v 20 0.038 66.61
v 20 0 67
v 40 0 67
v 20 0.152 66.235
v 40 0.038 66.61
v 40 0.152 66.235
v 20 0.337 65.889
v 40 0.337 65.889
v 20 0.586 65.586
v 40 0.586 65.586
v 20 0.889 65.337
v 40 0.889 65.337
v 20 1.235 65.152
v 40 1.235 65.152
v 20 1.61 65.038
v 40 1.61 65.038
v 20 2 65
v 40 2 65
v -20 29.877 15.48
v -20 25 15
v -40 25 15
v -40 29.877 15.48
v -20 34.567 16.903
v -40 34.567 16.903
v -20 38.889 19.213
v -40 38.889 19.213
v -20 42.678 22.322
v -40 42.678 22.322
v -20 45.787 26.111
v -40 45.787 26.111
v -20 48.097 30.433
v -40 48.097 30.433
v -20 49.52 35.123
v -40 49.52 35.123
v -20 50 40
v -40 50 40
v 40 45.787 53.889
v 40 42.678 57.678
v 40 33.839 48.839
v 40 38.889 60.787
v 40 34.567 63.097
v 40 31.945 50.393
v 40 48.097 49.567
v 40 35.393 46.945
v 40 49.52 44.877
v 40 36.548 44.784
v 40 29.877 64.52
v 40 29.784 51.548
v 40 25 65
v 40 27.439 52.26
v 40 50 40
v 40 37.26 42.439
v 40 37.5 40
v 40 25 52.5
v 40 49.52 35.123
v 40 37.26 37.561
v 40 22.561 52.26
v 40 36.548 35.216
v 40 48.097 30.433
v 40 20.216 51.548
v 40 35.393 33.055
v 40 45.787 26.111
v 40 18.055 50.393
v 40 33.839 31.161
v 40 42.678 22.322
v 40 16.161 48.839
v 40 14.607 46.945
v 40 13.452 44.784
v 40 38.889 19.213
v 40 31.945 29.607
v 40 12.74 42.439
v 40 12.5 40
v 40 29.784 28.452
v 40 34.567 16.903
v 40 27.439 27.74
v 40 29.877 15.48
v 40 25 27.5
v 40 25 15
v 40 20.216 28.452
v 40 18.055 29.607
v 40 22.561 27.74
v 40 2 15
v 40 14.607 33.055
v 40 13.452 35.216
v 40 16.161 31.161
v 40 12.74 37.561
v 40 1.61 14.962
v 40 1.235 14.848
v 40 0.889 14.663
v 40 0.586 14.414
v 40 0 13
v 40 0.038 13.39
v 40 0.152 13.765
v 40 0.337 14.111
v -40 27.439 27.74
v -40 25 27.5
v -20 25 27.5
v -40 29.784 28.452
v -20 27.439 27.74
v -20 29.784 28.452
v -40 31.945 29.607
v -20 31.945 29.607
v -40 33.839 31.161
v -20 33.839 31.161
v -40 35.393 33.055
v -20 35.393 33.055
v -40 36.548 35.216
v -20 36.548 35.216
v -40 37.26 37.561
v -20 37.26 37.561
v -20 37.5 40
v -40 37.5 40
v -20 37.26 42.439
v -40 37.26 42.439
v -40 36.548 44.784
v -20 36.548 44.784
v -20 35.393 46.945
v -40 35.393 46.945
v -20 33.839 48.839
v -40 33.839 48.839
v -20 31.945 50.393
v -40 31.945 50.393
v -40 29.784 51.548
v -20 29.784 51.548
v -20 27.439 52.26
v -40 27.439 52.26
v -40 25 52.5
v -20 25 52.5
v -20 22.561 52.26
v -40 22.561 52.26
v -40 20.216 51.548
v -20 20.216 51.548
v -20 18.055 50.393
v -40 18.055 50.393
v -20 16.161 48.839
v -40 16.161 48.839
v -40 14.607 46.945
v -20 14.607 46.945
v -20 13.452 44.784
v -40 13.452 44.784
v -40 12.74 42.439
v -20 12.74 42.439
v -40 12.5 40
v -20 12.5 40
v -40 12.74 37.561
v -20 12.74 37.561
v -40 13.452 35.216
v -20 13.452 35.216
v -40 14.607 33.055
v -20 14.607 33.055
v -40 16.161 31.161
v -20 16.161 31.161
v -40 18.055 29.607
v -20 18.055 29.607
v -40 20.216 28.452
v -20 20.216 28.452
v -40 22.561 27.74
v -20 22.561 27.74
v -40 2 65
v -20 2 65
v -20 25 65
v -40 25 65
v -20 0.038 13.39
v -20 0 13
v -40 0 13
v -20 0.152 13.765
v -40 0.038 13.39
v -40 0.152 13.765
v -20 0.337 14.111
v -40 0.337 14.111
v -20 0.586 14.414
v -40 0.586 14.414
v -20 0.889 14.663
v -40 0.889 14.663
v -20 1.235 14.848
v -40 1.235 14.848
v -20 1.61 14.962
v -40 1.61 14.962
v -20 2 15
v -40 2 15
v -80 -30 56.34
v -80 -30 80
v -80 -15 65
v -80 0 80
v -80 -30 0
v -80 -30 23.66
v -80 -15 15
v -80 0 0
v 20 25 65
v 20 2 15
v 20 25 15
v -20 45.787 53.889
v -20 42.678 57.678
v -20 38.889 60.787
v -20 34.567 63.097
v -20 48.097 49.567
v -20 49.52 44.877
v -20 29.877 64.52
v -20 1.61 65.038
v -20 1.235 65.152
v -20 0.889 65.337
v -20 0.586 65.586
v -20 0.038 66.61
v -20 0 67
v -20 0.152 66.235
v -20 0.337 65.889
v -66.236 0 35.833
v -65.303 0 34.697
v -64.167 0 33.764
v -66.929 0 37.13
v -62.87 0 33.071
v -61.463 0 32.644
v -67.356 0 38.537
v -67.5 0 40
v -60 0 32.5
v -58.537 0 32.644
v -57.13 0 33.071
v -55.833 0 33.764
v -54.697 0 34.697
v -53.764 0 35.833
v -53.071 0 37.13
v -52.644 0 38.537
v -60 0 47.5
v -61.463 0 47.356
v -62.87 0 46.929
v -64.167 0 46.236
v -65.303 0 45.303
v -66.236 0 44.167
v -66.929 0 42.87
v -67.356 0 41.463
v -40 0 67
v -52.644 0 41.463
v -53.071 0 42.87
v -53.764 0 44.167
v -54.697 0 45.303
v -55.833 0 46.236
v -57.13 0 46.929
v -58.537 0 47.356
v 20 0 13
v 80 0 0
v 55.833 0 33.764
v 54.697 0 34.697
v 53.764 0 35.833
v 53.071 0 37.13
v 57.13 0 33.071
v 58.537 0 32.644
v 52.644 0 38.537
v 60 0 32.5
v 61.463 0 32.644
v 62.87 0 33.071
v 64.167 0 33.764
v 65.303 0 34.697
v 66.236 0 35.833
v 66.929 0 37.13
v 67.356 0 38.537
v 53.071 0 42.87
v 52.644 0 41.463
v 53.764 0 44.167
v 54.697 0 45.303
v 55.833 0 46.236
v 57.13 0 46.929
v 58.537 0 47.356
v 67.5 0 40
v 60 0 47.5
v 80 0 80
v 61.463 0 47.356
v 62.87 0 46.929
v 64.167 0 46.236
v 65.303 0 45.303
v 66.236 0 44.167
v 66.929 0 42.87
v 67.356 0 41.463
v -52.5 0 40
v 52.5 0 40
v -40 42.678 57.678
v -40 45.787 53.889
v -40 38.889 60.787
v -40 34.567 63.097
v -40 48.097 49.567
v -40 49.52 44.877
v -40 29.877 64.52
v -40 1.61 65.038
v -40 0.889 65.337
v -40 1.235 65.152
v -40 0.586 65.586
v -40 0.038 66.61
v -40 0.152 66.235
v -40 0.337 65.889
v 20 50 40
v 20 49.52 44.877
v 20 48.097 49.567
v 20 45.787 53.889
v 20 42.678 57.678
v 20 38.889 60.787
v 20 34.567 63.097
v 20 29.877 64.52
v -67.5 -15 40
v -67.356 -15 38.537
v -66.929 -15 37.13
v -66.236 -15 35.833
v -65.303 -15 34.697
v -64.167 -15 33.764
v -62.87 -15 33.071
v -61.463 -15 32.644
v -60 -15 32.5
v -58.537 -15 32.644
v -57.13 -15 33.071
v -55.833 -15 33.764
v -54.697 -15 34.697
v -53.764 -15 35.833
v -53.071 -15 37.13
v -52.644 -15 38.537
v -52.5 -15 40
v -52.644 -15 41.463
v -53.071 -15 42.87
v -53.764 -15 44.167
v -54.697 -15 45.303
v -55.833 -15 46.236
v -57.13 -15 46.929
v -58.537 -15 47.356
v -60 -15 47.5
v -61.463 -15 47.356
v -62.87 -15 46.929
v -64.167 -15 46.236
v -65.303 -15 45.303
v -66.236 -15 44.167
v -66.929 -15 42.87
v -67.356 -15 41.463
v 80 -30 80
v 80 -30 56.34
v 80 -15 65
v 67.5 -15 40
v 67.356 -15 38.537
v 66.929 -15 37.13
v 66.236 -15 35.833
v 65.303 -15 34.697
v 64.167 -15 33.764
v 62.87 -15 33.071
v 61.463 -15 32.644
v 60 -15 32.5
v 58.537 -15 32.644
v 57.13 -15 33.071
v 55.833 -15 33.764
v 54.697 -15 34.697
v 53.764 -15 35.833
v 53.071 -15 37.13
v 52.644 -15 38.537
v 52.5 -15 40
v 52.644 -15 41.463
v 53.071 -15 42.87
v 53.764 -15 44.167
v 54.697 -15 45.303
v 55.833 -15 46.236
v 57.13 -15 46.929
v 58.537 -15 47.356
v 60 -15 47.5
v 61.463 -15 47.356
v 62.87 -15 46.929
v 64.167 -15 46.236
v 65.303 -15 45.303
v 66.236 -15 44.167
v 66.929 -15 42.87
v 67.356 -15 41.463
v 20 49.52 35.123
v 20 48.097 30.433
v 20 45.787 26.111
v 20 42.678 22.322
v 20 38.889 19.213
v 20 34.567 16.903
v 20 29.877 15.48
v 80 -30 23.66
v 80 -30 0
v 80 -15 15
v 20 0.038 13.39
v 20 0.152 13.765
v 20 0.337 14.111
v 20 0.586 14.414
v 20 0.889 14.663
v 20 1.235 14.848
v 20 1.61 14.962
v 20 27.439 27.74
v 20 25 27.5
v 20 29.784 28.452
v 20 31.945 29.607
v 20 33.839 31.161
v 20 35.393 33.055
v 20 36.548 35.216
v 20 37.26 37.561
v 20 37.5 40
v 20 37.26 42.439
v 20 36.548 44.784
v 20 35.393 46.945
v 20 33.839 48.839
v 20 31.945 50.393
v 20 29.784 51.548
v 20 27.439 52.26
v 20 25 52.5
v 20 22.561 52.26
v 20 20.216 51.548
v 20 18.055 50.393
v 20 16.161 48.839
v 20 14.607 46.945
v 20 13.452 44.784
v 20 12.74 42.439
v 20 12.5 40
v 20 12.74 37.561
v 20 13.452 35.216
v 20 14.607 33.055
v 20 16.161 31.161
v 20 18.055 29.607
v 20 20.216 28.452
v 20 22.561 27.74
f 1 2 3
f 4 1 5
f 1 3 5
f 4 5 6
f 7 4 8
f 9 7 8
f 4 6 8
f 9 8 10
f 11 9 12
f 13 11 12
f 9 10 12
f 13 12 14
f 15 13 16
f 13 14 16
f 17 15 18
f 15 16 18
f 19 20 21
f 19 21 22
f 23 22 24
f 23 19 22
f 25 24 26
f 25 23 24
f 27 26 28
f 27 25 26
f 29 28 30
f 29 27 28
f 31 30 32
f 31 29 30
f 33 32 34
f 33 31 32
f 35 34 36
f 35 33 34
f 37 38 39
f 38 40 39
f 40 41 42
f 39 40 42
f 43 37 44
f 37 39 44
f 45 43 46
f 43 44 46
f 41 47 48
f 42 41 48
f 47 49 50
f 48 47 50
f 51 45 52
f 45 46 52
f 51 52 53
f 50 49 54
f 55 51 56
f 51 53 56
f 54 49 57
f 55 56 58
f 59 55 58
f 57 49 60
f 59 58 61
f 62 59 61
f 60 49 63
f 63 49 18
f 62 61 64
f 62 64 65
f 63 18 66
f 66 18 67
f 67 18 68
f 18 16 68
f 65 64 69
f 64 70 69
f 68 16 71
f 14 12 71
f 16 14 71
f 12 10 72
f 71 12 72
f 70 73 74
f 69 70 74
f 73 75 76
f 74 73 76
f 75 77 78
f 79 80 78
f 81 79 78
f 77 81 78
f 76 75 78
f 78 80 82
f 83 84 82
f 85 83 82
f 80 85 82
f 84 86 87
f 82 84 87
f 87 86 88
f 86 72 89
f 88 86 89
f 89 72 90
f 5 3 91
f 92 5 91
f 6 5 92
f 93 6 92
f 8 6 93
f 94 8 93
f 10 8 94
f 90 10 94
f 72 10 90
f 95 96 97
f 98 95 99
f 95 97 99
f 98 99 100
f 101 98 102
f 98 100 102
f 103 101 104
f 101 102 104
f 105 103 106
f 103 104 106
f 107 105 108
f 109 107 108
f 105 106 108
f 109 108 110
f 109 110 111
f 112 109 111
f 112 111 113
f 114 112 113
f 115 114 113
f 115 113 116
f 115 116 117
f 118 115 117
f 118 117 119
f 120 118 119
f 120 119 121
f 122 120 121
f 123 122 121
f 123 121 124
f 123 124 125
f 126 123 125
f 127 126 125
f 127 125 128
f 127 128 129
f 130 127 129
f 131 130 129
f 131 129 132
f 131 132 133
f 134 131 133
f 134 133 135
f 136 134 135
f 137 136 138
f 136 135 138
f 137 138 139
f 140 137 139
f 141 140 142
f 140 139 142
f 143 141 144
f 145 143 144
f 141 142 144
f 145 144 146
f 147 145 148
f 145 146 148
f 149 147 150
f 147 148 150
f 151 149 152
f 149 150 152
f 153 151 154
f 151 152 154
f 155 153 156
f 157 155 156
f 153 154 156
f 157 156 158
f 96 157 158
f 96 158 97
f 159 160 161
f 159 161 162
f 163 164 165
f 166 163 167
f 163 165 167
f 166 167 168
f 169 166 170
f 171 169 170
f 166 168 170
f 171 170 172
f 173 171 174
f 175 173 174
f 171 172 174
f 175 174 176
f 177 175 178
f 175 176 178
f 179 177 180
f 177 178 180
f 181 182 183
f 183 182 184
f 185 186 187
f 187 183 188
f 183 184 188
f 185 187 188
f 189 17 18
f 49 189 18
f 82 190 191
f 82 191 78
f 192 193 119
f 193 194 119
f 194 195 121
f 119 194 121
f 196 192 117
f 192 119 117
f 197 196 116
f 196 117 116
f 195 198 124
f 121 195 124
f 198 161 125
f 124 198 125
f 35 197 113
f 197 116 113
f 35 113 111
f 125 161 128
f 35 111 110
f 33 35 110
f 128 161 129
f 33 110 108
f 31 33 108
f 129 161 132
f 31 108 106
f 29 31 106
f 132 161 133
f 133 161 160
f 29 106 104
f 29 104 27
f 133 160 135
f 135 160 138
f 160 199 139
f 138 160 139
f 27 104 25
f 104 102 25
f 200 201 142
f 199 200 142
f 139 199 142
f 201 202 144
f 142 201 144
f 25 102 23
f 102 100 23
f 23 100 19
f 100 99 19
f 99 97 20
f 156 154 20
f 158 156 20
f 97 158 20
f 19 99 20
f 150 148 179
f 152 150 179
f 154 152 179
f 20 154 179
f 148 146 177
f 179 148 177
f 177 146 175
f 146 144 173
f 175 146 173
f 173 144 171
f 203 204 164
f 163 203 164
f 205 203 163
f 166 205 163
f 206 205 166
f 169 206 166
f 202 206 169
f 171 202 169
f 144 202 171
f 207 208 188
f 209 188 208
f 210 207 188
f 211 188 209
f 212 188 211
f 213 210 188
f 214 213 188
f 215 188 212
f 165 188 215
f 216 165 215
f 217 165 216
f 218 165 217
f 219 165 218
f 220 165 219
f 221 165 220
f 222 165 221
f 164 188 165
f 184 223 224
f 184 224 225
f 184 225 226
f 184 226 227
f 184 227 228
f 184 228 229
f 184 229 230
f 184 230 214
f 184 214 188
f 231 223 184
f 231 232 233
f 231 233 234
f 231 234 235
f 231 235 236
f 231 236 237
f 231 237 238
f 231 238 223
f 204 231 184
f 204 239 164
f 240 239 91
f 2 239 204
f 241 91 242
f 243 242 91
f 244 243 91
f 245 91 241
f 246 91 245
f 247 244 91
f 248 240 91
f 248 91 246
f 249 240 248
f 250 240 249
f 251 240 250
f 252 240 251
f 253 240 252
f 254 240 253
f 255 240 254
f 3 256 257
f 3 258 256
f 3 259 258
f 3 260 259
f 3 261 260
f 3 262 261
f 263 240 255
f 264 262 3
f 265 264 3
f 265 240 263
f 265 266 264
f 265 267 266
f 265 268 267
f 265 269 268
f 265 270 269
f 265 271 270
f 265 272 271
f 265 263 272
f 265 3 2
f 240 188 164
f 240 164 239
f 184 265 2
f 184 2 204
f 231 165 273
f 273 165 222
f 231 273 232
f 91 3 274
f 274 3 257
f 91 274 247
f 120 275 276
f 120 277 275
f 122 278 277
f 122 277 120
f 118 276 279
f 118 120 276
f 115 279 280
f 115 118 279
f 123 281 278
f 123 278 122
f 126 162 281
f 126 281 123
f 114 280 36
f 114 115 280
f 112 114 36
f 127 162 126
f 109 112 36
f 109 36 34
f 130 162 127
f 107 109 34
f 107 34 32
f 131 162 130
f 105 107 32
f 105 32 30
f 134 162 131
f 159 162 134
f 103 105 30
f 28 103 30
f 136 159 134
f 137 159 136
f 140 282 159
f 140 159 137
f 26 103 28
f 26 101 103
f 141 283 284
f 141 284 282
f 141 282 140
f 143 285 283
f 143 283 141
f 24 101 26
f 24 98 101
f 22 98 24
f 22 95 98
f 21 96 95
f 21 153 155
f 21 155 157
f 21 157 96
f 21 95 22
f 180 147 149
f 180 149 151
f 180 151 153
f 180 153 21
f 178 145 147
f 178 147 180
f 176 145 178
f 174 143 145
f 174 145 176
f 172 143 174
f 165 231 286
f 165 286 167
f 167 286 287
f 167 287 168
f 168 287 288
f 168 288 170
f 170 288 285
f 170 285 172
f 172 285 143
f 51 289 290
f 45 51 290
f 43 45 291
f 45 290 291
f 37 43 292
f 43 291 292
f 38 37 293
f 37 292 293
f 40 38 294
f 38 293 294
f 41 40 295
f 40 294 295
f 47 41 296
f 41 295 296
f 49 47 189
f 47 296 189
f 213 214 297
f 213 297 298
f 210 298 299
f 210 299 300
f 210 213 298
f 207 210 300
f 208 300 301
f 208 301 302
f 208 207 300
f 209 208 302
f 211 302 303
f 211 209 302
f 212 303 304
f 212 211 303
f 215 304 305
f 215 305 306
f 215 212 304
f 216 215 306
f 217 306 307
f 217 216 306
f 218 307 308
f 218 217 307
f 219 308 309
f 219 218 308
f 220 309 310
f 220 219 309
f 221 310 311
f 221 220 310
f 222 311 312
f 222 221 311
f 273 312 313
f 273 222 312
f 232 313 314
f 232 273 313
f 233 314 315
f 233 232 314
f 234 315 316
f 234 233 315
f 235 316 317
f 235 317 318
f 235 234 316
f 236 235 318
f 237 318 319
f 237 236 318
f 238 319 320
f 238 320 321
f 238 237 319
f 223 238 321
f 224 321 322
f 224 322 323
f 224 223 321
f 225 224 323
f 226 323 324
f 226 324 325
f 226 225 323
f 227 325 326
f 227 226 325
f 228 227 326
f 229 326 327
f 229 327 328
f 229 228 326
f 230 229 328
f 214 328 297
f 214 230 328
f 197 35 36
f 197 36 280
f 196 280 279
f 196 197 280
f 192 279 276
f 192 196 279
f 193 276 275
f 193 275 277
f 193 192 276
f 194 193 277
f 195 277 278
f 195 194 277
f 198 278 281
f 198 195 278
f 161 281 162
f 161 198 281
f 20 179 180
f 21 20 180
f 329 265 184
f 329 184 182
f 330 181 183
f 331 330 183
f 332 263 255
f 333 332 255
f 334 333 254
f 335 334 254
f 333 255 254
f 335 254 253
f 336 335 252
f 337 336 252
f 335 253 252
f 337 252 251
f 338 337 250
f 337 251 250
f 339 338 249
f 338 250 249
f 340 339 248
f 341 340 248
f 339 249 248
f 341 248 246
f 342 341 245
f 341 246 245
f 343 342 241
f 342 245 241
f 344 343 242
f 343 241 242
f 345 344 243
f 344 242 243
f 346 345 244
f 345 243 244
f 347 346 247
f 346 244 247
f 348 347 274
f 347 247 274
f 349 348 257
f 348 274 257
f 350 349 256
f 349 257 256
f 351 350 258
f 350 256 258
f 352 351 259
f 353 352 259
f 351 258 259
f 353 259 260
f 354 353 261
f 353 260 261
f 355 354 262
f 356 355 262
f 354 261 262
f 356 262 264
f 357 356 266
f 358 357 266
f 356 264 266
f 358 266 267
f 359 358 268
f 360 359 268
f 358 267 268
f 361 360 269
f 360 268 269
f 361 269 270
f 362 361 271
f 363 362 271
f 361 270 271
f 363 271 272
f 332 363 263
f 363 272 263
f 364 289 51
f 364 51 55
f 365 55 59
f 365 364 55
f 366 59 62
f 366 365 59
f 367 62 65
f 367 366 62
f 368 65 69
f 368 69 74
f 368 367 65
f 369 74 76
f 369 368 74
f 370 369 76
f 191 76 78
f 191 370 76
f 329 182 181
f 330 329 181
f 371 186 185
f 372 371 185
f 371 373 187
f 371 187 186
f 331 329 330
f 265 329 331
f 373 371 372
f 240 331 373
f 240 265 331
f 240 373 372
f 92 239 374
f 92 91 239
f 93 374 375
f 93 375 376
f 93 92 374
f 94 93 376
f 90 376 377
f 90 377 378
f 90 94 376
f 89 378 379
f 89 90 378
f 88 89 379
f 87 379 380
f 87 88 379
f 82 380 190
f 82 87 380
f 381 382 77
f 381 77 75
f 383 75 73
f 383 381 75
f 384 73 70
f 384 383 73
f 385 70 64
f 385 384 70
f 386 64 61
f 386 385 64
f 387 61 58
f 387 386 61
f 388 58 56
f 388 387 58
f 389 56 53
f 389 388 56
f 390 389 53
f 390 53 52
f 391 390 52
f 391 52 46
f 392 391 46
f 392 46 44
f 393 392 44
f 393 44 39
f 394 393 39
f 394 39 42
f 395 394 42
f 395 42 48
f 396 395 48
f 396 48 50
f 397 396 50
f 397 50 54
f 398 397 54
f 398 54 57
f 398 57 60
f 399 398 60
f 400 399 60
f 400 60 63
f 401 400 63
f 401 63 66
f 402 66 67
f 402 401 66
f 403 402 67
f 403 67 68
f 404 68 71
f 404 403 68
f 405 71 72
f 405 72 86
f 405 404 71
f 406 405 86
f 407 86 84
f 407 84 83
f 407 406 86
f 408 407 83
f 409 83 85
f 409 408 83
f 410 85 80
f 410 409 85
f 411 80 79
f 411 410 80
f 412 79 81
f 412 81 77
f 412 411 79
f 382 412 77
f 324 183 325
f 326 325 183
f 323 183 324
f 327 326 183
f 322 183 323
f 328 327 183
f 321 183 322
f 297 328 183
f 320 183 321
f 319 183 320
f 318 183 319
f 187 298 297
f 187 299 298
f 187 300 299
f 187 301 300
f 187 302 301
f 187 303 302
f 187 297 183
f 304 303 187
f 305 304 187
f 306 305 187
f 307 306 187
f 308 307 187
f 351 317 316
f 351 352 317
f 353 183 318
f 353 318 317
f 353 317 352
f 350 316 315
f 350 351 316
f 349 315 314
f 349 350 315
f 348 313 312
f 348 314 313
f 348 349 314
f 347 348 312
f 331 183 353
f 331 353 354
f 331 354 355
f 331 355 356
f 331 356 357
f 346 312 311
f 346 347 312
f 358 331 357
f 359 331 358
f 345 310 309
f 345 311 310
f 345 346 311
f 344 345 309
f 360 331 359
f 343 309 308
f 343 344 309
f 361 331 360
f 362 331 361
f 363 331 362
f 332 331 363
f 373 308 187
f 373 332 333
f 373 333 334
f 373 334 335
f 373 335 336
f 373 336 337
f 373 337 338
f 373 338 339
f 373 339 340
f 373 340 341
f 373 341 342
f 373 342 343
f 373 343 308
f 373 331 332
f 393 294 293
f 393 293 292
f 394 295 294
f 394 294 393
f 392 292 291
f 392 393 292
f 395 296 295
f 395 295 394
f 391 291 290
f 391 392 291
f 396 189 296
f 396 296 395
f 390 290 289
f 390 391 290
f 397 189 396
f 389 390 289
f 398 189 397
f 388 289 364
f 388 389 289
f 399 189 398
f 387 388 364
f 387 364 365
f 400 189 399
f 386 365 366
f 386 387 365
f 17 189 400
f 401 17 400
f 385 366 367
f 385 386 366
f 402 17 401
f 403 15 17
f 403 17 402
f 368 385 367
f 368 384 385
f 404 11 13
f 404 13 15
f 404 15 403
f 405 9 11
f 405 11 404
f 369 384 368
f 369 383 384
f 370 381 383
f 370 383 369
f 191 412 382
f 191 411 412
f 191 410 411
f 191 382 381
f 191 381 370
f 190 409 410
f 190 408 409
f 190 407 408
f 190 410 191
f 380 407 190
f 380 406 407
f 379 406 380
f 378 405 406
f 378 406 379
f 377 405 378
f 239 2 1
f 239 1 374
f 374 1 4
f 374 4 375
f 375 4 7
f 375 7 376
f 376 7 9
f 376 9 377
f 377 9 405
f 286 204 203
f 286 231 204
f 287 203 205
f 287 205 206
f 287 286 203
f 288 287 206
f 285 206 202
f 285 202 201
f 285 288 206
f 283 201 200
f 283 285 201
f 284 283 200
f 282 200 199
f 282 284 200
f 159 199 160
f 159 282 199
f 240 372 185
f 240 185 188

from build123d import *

# Parameters (mm, degrees)
BOSS_EXTRUDE1_DEPTH = 80
SKETCH4_W           = 20
SKETCH4_H           = 50
BOSS_EXTRUDE2_DEPTH = 50
SKETCH5_R           = 7.5
CUT_EXTRUDE2_DEPTH  = 15
CUT_EXTRUDE3_DEPTH  = 40
CUT_EXTRUDE4_DEPTH  = 40
SKETCH13_R          = 12.5
CUT_EXTRUDE5_DEPTH  = 40
CUT_EXTRUDE6_DEPTH  = 20
FILLET1_R           = 2


with BuildPart() as part:
    # Sketch1 → Boss-Extrude1 (new body)
    with BuildSketch(Plane(origin=(0, 0, 0), x_dir=(0, 0, -1), z_dir=(1, 0, 0))):
        Polygon((-65, -15), (-15, -15), (-23.660254038, -30), (0, -30), (0, 0), (-80, 0), (-80, -30), (-56.339745962, -30), align=None)
    boss_extrude1 = extrude(amount=BOSS_EXTRUDE1_DEPTH)

    # Sketch4 → Boss-Extrude2 (add)
    with BuildSketch(Plane(origin=(0, 0, 0), x_dir=(1, 0, 0), z_dir=(0, 1, 0))):
        with Locations((30, -40)):
            Rectangle(SKETCH4_W, SKETCH4_H)
    boss_extrude2 = extrude(amount=BOSS_EXTRUDE2_DEPTH)

    # Sketch5 → Cut-Extrude2 (cut)
    with BuildSketch(Plane(origin=(0, 0, 0), x_dir=(1, 0, 0), z_dir=(0, 1, 0))):
        with Locations((60, -40)):
            Circle(SKETCH5_R)
    cut_extrude2 = extrude(amount=-CUT_EXTRUDE2_DEPTH, mode=Mode.SUBTRACT)

    # Sketch9 → Cut-Extrude3 (cut)
    with BuildSketch(Plane(origin=(0, 0, 0), x_dir=(0, 0, -1), z_dir=(1, 0, 0))):
        with BuildLine():
            Line((-65, 25), (-65, 50))
            Line((-65, 50), (-40, 50))
            ThreePointArc((-40, 50), (-57.67766953, 42.67766953), (-65, 25))
        make_face()
    cut_extrude3 = extrude(amount=CUT_EXTRUDE3_DEPTH, mode=Mode.SUBTRACT)

    # Sketch11 → Cut-Extrude4 (cut)
    with BuildSketch(Plane(origin=(0, 0, 0), x_dir=(0, 0, -1), z_dir=(1, 0, 0))):
        with BuildLine():
            Line((-15, 25), (-15, 50))
            Line((-15, 50), (-40, 50))
            ThreePointArc((-40, 50), (-22.32233047, 42.67766953), (-15, 25))
        make_face()
    extrude(amount=CUT_EXTRUDE4_DEPTH, mode=Mode.SUBTRACT)

    # Sketch13 → Cut-Extrude5 (cut)
    with BuildSketch(Plane(origin=(0, 0, 0), x_dir=(0, 0, -1), z_dir=(1, 0, 0))):
        with Locations((-40, 25)):
            Circle(SKETCH13_R)
    cut_extrude5 = extrude(amount=CUT_EXTRUDE5_DEPTH, mode=Mode.SUBTRACT)

    # Mirror3: Boss-Extrude1, Boss-Extrude2, Cut-Extrude2, Cut-Extrude3, Cut-Extrude5 across plane
    add(boss_extrude1.mirror(Plane(origin=(0, 0, 0), x_dir=(0, 0, 1), z_dir=(1, 0, 0))))
    add(boss_extrude2.mirror(Plane(origin=(0, 0, 0), x_dir=(0, 0, 1), z_dir=(1, 0, 0))))
    add(cut_extrude2.mirror(Plane(origin=(0, 0, 0), x_dir=(0, 0, 1), z_dir=(1, 0, 0))), mode=Mode.SUBTRACT)
    add(cut_extrude3.mirror(Plane(origin=(0, 0, 0), x_dir=(0, 0, 1), z_dir=(1, 0, 0))), mode=Mode.SUBTRACT)
    add(cut_extrude5.mirror(Plane(origin=(0, 0, 0), x_dir=(0, 0, 1), z_dir=(1, 0, 0))), mode=Mode.SUBTRACT)

    # Sketch17 → Cut-Extrude6 (cut)
    with BuildSketch(Plane(origin=(-20, 0, 0), x_dir=(0, 0, -1), z_dir=(1, 0, 0))):
        with BuildLine():
            Line((-40, 50), (-15, 50))
            Line((-15, 50), (-15, 25))
            ThreePointArc((-15, 25), (-22.32233047, 42.67766953), (-40, 50))
        make_face()
    extrude(amount=-CUT_EXTRUDE6_DEPTH, mode=Mode.SUBTRACT)

    # Fillet1
    fillet1_edges = [part.edges().sort_by_distance(p)[0] for p in [
        (-30, 0, 65),
        (-30, 0, 15),
        (30, 0, 65),
        (30, 0, 15),
    ]]
    fillet(fillet1_edges, radius=FILLET1_R)


solid = part.part
